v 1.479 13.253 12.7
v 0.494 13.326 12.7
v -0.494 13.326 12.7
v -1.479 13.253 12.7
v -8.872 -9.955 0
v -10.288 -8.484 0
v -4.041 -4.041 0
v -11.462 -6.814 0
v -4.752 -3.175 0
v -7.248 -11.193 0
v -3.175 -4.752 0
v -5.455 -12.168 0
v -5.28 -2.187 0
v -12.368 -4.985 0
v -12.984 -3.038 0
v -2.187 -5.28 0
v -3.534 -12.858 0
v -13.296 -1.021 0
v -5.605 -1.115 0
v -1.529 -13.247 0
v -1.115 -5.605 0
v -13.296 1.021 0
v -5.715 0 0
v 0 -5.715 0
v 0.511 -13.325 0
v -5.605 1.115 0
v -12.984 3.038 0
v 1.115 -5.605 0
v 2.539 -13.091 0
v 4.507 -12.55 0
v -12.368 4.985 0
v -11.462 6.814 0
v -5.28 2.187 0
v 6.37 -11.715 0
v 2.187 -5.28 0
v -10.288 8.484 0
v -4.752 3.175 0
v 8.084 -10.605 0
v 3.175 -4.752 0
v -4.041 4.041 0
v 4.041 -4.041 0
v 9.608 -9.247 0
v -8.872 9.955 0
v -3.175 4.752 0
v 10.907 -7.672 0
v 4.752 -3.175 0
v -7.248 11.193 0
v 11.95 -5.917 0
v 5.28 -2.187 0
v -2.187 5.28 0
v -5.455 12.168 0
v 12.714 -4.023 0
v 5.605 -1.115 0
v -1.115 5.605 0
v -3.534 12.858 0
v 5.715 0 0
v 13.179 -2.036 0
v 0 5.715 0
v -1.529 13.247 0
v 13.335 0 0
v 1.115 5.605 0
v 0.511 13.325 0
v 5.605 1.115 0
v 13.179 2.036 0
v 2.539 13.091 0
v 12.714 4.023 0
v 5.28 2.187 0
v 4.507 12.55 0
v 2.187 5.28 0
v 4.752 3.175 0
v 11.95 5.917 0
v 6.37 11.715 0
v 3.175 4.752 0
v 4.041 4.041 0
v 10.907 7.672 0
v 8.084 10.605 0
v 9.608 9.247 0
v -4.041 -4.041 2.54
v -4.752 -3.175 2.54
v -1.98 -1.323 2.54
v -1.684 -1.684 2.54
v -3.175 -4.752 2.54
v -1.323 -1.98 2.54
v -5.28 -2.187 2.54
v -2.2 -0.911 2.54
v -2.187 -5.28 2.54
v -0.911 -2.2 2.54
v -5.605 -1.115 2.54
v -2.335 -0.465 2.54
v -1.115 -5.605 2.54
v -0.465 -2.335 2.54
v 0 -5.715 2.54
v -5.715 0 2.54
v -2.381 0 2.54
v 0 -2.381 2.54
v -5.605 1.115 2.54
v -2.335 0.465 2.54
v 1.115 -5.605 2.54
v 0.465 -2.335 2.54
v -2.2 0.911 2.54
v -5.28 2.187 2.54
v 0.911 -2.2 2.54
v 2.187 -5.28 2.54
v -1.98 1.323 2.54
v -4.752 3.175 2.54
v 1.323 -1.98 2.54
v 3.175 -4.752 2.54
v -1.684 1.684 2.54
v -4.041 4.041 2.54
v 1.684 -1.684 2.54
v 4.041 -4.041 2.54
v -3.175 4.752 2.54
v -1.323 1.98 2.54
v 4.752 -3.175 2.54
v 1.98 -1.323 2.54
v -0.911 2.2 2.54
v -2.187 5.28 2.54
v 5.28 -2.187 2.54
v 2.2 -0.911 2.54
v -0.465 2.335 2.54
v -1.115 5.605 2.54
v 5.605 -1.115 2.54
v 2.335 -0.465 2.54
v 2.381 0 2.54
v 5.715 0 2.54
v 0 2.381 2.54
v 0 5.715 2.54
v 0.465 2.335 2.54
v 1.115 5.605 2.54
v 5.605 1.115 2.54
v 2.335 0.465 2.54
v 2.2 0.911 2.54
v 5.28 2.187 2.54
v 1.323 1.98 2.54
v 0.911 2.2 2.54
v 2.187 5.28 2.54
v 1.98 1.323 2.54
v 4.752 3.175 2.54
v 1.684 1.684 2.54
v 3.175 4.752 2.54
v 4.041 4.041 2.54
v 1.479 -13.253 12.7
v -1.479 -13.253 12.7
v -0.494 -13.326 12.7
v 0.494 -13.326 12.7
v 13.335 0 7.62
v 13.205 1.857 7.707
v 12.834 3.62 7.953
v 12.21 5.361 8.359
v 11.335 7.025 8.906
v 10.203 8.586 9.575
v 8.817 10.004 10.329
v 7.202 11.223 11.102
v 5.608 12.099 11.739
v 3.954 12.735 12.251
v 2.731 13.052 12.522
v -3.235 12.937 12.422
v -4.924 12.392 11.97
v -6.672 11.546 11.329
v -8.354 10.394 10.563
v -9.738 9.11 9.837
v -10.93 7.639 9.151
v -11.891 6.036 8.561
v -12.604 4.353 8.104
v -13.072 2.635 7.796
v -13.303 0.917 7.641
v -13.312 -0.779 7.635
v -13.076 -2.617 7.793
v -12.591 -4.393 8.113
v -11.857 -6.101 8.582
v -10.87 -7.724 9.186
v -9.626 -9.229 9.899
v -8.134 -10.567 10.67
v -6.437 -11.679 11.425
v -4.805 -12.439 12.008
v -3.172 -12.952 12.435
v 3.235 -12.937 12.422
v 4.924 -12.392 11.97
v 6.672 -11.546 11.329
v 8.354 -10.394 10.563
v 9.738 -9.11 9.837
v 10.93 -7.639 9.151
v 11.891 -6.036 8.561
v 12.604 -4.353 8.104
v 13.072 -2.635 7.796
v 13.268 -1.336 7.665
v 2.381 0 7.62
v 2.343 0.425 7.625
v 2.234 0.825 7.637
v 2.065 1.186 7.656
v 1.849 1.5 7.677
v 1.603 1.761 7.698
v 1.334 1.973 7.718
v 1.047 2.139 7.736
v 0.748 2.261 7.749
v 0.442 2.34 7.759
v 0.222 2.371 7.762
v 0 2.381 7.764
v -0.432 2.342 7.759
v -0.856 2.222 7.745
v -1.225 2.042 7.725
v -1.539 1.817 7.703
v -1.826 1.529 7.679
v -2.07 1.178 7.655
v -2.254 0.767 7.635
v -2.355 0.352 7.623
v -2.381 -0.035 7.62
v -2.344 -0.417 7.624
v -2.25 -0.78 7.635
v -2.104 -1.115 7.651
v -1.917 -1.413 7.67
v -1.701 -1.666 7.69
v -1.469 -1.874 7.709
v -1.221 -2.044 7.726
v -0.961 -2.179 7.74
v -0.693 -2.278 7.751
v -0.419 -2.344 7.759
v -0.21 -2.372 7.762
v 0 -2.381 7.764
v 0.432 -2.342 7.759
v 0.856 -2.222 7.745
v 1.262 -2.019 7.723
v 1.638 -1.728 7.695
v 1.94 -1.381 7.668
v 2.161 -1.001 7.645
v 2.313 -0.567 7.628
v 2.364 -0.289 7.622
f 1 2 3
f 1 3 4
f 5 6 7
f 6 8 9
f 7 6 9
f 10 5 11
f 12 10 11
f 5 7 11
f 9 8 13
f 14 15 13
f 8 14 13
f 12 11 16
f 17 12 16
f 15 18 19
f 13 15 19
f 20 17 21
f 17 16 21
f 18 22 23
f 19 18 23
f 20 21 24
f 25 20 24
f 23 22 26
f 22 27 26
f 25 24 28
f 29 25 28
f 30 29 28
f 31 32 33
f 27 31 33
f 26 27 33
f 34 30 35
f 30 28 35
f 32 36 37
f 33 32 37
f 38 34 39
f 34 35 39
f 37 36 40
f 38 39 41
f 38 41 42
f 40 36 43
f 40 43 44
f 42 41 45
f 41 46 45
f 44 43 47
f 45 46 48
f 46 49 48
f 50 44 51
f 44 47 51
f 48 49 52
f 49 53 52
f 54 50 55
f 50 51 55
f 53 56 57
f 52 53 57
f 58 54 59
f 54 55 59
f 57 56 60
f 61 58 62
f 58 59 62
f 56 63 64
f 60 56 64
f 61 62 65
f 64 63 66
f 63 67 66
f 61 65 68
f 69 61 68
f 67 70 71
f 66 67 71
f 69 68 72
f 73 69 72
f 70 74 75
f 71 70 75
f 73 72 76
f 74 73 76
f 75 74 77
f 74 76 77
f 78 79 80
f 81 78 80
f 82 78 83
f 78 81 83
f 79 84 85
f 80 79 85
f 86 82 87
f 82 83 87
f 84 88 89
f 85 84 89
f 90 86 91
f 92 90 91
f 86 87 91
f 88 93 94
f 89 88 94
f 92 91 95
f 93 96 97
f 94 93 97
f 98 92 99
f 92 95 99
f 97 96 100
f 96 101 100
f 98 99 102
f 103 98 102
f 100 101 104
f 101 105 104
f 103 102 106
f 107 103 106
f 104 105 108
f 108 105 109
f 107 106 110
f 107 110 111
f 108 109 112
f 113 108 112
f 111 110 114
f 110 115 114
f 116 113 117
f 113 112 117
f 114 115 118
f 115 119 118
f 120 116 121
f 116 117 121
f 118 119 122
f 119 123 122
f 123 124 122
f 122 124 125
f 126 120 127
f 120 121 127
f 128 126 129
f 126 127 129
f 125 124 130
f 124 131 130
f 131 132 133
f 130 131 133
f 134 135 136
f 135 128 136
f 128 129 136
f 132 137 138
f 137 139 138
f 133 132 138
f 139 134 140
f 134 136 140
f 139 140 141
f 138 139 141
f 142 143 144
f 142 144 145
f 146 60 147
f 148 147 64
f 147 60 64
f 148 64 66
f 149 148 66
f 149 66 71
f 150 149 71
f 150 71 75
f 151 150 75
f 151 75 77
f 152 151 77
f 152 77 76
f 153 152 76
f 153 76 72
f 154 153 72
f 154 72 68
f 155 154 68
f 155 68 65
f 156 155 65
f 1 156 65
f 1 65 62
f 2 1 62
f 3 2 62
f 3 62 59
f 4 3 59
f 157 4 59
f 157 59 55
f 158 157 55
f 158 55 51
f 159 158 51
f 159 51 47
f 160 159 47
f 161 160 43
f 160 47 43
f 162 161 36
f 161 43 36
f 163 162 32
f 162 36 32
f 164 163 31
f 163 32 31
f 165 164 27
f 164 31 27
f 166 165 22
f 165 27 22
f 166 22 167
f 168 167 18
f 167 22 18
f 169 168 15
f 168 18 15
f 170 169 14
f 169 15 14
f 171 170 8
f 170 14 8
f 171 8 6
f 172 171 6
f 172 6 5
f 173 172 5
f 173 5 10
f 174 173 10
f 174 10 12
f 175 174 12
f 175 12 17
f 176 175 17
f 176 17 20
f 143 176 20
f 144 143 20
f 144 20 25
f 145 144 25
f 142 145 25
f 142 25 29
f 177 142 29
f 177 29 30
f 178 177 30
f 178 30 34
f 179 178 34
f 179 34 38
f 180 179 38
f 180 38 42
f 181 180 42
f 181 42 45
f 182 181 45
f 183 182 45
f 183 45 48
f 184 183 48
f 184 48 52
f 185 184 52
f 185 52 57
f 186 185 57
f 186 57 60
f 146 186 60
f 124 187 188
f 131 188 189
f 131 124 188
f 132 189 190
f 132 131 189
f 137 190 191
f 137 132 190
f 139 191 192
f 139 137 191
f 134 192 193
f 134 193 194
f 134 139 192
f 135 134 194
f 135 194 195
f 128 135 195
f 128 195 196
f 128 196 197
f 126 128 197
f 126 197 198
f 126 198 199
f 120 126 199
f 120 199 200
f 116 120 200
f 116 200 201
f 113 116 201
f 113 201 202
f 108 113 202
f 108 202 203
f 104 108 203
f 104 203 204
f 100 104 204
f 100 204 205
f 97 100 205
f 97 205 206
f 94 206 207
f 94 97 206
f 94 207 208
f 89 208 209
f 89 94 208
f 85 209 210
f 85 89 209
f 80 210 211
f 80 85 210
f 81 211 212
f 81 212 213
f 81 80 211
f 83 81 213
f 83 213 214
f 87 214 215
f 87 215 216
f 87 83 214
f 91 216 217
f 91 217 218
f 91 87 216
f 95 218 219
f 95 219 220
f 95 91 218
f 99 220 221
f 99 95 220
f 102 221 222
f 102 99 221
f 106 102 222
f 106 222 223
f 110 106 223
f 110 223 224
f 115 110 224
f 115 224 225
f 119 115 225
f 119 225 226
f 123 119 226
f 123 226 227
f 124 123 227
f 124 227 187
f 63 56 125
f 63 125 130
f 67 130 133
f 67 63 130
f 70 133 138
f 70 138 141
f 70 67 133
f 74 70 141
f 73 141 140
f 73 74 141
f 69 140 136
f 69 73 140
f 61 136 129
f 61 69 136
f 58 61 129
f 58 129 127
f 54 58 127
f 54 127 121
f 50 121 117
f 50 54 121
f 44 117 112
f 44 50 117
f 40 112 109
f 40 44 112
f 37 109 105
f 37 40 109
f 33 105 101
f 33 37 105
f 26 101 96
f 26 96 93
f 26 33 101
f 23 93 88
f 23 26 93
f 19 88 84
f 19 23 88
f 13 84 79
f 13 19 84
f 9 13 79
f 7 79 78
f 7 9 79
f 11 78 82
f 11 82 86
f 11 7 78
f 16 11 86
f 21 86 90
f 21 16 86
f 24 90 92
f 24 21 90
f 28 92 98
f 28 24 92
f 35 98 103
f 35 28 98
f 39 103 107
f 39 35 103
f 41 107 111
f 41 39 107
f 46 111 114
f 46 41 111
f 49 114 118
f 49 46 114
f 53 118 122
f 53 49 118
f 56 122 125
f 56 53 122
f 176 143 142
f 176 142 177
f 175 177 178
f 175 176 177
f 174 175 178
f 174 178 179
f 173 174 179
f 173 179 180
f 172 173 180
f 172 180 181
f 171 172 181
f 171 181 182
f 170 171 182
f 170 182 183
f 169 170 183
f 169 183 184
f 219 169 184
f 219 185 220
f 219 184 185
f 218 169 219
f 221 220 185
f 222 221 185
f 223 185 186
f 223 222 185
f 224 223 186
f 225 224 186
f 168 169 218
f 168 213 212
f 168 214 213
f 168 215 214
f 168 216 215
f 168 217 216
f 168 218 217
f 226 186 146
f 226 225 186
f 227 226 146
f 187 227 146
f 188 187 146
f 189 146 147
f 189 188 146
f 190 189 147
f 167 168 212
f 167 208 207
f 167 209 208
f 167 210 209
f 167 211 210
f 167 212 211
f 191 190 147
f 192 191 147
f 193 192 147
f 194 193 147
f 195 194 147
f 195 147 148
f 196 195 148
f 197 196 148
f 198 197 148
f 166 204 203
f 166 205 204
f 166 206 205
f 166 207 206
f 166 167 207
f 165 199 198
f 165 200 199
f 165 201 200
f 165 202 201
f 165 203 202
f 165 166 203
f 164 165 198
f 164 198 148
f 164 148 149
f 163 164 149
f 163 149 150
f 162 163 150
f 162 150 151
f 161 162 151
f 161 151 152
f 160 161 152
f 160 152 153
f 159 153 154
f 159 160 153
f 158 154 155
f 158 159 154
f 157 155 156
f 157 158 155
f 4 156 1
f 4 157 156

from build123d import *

# Parameters (mm, degrees)
F0_R          = 13.335
F0_R_2        = 5.715
F0_R_3        = 2.38125
F1_DEPTH      = 12.7
F2_DEPTH      = 2.54
F3_R          = 19.8268343705
F4_DEPTH      = 13.336
F4_DEPTH_BACK = 13.336


with BuildPart() as f1:
    # F0 (on Top) → F1 (new body)
    with BuildSketch(Plane.XY):
        Circle(F0_R)
        Circle(F0_R_2, mode=Mode.SUBTRACT)
        Circle(F0_R_2)
        Circle(F0_R_3, mode=Mode.SUBTRACT)
    extrude(amount=F1_DEPTH)

    # F0 (on Top) → F2 (cut)
    with BuildSketch(Plane.XY):
        Circle(F0_R_2)
        Circle(F0_R_3, mode=Mode.SUBTRACT)
    extrude(amount=F2_DEPTH, mode=Mode.SUBTRACT)

    # F3 (on Right) → F4 (cut, two sides)
    with BuildSketch(Plane.YZ) as f4_sk:
        with Locations((0, 27.4468343705)):
            Circle(F3_R)
    extrude(amount=-F4_DEPTH, mode=Mode.SUBTRACT)
    extrude(f4_sk.sketch, amount=F4_DEPTH_BACK, mode=Mode.SUBTRACT)


solid = f1.part
